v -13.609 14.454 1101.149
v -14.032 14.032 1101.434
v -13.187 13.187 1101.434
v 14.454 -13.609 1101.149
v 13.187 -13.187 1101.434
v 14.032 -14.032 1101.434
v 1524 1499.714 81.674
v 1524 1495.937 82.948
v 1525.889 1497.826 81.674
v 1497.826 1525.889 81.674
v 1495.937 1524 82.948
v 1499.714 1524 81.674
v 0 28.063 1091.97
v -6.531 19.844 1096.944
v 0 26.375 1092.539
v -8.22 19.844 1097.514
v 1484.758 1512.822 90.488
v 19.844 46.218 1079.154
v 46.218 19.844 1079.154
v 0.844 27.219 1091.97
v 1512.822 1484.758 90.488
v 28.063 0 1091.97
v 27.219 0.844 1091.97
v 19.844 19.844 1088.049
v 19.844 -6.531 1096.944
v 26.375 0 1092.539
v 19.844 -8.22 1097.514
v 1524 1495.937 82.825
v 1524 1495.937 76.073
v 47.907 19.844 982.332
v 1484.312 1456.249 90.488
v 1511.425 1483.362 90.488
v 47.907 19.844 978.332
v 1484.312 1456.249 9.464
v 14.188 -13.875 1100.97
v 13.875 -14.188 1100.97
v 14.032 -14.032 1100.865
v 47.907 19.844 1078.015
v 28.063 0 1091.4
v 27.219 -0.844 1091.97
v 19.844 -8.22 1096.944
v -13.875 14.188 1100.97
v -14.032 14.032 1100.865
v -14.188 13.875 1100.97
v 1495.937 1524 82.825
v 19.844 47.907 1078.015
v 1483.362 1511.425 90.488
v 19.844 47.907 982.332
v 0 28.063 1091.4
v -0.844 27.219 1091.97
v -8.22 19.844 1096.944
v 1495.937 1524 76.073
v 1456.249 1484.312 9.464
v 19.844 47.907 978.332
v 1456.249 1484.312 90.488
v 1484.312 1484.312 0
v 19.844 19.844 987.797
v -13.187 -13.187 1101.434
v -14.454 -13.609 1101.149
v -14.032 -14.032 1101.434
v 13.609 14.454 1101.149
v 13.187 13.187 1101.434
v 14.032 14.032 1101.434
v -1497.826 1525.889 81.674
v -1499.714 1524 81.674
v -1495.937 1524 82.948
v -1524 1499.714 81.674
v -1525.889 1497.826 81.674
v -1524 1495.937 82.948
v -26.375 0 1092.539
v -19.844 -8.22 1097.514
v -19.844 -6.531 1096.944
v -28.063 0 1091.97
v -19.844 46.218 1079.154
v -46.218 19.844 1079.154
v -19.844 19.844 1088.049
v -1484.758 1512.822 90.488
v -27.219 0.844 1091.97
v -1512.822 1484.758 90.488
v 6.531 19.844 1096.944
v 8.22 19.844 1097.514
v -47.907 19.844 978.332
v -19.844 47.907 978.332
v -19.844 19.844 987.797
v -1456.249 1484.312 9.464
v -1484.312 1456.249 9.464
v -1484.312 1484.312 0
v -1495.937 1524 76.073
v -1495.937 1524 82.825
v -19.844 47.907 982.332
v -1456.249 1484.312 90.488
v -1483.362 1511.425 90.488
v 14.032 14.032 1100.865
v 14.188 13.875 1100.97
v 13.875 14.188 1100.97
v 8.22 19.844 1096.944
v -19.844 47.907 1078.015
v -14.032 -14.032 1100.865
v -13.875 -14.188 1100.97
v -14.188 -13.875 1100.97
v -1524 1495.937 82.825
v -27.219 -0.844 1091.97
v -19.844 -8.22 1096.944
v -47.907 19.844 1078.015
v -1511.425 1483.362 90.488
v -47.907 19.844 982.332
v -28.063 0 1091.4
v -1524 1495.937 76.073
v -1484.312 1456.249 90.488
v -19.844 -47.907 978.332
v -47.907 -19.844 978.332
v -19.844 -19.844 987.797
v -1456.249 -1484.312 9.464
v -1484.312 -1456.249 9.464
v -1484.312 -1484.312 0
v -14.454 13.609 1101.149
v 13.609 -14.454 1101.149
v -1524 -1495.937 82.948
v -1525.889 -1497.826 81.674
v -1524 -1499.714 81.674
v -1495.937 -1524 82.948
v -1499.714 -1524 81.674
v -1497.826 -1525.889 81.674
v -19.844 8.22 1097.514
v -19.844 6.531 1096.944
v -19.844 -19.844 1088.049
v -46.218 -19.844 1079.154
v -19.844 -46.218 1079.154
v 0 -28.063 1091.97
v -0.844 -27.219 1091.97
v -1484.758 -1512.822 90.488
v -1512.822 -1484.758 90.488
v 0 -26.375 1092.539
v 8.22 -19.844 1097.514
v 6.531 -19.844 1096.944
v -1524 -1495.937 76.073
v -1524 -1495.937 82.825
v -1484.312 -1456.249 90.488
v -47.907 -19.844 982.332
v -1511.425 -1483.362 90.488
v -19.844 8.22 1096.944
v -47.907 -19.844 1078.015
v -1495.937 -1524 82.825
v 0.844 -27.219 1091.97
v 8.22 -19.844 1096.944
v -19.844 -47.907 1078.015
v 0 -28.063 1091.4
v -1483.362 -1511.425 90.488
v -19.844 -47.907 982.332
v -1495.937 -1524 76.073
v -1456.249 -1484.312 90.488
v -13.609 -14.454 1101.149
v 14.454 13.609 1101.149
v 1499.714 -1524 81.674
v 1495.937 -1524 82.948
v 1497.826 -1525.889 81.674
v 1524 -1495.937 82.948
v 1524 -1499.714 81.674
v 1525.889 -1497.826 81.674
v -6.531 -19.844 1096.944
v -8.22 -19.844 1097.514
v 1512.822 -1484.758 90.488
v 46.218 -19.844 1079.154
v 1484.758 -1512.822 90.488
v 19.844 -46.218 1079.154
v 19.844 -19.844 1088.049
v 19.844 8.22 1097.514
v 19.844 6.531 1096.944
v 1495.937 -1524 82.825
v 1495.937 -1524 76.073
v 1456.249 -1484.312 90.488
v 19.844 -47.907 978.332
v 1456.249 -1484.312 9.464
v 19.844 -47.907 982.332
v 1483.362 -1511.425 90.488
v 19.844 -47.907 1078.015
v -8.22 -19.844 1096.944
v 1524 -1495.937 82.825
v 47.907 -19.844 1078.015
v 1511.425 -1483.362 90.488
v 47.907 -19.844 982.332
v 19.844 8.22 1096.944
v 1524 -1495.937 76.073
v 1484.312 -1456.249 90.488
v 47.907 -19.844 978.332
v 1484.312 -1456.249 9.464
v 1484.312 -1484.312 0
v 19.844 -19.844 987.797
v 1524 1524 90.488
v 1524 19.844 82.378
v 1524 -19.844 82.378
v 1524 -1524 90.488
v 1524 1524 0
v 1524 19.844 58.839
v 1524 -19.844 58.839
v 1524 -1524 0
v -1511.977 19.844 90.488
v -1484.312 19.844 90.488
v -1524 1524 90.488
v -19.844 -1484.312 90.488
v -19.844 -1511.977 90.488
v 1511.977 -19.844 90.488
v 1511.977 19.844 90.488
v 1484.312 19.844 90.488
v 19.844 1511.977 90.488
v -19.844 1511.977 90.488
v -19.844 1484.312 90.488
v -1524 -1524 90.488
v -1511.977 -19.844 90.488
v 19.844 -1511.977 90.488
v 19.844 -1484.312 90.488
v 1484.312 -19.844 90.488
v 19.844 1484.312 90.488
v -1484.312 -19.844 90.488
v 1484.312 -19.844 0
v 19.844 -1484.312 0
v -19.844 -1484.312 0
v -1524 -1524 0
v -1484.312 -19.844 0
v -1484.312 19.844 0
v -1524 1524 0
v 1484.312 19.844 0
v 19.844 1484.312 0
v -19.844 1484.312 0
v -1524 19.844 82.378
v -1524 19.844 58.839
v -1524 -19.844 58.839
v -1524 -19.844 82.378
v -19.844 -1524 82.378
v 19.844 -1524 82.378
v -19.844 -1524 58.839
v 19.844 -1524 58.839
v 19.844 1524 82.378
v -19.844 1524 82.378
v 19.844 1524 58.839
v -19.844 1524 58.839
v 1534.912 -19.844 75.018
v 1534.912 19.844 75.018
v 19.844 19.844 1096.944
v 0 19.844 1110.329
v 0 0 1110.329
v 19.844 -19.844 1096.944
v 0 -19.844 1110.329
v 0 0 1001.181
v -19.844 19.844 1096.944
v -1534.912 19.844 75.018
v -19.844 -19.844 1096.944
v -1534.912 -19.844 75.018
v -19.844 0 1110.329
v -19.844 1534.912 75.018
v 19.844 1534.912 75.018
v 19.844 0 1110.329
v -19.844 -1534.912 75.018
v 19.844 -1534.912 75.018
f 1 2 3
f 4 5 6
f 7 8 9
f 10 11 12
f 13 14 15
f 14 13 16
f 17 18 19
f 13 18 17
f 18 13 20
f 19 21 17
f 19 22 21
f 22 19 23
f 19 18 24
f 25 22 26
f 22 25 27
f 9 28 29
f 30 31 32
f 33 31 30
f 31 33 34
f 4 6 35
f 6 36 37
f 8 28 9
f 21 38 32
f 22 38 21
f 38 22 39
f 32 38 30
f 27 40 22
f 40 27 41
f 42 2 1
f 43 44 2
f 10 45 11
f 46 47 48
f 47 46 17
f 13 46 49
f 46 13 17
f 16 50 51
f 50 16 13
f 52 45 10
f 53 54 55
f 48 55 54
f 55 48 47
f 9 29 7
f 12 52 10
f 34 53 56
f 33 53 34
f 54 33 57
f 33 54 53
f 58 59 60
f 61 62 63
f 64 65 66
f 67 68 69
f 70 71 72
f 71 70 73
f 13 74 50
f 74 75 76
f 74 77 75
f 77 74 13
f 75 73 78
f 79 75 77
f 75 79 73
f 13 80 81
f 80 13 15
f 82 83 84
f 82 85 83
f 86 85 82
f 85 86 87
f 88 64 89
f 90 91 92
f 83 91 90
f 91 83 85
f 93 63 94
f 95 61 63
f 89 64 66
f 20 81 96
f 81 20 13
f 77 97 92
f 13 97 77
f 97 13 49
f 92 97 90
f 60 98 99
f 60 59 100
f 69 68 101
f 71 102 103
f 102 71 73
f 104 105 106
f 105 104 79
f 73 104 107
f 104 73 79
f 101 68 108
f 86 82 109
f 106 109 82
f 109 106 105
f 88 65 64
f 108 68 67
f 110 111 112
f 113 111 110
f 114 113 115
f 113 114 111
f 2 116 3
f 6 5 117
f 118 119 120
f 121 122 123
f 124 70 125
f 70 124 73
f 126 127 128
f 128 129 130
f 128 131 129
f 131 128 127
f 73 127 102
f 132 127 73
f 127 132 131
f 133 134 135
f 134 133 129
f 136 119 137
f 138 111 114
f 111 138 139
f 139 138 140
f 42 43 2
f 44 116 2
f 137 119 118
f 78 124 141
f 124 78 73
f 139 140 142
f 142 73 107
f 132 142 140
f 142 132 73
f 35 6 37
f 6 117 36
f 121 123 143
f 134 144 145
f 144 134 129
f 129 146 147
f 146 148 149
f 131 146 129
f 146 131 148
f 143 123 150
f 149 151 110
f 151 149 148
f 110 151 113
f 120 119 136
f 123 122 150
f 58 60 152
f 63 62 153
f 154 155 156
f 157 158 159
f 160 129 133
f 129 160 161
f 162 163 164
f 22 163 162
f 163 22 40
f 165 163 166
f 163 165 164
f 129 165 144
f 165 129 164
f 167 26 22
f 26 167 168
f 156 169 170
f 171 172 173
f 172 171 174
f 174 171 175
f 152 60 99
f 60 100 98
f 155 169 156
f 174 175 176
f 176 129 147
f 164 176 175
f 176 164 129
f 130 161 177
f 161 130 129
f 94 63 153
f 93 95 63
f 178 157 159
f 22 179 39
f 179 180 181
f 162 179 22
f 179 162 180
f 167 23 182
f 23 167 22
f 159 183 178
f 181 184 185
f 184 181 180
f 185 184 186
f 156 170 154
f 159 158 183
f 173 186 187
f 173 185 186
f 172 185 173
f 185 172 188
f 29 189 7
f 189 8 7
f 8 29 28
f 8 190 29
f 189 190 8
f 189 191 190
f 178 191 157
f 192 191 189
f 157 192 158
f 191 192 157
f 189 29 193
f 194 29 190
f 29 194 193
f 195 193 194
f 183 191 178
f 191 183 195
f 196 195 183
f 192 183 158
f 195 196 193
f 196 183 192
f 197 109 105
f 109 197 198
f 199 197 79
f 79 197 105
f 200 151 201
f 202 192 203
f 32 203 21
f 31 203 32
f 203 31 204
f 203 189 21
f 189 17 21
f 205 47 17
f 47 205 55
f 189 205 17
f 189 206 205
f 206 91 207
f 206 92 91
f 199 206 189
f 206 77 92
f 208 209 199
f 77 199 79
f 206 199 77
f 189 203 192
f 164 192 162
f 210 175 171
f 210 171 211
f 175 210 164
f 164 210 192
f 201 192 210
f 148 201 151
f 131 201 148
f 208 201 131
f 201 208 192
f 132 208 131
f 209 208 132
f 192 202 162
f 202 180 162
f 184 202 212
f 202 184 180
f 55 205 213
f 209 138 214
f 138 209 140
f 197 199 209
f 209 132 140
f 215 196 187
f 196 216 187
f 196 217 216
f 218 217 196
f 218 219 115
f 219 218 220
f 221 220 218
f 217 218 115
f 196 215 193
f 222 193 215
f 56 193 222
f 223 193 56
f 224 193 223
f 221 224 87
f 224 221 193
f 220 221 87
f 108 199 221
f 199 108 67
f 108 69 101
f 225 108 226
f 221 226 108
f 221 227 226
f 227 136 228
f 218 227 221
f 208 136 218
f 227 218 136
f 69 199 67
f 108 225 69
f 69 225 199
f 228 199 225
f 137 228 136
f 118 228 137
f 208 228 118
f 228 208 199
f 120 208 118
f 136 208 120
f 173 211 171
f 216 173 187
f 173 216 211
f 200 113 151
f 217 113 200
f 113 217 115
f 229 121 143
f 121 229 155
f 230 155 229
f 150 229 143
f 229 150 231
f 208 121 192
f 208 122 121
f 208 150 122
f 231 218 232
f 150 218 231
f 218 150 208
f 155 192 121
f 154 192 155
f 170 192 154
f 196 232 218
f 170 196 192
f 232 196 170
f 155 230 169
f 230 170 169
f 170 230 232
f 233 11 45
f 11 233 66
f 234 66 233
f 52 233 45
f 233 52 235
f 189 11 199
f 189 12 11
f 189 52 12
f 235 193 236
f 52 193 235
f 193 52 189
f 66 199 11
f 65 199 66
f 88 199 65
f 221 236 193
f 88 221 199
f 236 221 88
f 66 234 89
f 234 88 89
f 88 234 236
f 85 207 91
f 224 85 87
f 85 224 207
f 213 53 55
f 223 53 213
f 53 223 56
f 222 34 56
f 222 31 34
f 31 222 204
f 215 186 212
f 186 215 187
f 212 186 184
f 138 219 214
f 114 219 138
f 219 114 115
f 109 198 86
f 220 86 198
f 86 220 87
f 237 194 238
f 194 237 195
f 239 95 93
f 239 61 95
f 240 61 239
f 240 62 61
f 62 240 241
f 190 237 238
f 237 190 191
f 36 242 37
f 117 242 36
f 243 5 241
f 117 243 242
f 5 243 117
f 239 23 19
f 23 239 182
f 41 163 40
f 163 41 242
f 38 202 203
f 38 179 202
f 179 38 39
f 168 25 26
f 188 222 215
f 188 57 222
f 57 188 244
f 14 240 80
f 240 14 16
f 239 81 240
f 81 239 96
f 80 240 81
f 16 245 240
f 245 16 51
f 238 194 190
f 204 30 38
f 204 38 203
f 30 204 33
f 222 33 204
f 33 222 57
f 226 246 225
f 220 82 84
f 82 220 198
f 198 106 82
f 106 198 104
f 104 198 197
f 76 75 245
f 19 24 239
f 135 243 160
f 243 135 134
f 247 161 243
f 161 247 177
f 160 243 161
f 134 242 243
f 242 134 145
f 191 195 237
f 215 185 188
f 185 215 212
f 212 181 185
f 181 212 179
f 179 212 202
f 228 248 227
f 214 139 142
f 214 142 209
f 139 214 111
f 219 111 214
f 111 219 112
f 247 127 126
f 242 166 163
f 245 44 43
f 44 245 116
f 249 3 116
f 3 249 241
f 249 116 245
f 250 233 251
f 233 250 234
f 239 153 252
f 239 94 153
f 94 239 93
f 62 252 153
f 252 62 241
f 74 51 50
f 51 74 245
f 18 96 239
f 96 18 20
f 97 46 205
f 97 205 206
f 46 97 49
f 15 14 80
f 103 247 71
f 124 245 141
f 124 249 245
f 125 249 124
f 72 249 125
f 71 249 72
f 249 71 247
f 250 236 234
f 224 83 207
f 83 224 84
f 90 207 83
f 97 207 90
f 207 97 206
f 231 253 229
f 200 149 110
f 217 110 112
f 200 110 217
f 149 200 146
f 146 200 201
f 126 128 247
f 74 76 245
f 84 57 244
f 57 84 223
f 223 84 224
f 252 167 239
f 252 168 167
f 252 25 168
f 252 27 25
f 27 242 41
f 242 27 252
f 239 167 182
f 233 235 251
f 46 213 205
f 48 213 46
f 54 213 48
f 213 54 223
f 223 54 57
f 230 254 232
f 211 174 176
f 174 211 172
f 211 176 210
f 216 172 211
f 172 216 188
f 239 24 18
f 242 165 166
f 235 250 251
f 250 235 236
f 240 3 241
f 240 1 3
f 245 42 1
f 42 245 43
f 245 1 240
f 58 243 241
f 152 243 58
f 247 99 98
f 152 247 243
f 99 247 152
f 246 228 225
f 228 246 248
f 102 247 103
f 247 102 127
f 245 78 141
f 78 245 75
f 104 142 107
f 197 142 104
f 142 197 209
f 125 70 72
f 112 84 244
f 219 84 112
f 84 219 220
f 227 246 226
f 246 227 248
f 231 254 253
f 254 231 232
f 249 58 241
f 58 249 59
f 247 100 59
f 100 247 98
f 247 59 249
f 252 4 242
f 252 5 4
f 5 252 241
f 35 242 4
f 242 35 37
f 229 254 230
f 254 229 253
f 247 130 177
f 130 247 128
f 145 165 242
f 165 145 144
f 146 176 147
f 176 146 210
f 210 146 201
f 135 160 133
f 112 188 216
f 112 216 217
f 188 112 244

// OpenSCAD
inch=25.4;
tbf_width=3.5625*inch;
tbf_height=1.5625*inch;

angle=34;
width=10*12*inch;
height=(width/2-tbf_height)/tan(90-angle);


leg=sqrt(pow((width/2-tbf_height),2)*2+pow(height,2));
echo(leg/inch/12);


for (i=[0:3]){
    translate([0,0,height])
    rotate([0,0,45+90*i])
    rotate([0,asin((height)/leg),0])
    translate([-tan(asin(height/leg))*tbf_width,-tbf_height/2,0])
    cube([leg+tan(asin(height/leg))*tbf_width,tbf_height,tbf_width]);
}


for (i=[0:1]){
    rotate([0,0,90*i]){
        translate([-width/2,-width/2,0])
        cube([width,tbf_height,tbf_width]);
        translate([-width/2,width/2-tbf_height,0])
        cube([width,tbf_height,tbf_width]);
    }
}

echo((width/2-tbf_height)/cos(angle)/inch/12);

for (i=[0:3]){
    rotate([0,0,90*i]){
        translate([0,0,height])
        rotate([0,angle,0])
        translate([-tbf_width*tan(angle),-tbf_height/2,0])
        cube([(width/2-tbf_height)/cos(angle)+tbf_width*tan(angle),tbf_height,tbf_width]);
    }
}
